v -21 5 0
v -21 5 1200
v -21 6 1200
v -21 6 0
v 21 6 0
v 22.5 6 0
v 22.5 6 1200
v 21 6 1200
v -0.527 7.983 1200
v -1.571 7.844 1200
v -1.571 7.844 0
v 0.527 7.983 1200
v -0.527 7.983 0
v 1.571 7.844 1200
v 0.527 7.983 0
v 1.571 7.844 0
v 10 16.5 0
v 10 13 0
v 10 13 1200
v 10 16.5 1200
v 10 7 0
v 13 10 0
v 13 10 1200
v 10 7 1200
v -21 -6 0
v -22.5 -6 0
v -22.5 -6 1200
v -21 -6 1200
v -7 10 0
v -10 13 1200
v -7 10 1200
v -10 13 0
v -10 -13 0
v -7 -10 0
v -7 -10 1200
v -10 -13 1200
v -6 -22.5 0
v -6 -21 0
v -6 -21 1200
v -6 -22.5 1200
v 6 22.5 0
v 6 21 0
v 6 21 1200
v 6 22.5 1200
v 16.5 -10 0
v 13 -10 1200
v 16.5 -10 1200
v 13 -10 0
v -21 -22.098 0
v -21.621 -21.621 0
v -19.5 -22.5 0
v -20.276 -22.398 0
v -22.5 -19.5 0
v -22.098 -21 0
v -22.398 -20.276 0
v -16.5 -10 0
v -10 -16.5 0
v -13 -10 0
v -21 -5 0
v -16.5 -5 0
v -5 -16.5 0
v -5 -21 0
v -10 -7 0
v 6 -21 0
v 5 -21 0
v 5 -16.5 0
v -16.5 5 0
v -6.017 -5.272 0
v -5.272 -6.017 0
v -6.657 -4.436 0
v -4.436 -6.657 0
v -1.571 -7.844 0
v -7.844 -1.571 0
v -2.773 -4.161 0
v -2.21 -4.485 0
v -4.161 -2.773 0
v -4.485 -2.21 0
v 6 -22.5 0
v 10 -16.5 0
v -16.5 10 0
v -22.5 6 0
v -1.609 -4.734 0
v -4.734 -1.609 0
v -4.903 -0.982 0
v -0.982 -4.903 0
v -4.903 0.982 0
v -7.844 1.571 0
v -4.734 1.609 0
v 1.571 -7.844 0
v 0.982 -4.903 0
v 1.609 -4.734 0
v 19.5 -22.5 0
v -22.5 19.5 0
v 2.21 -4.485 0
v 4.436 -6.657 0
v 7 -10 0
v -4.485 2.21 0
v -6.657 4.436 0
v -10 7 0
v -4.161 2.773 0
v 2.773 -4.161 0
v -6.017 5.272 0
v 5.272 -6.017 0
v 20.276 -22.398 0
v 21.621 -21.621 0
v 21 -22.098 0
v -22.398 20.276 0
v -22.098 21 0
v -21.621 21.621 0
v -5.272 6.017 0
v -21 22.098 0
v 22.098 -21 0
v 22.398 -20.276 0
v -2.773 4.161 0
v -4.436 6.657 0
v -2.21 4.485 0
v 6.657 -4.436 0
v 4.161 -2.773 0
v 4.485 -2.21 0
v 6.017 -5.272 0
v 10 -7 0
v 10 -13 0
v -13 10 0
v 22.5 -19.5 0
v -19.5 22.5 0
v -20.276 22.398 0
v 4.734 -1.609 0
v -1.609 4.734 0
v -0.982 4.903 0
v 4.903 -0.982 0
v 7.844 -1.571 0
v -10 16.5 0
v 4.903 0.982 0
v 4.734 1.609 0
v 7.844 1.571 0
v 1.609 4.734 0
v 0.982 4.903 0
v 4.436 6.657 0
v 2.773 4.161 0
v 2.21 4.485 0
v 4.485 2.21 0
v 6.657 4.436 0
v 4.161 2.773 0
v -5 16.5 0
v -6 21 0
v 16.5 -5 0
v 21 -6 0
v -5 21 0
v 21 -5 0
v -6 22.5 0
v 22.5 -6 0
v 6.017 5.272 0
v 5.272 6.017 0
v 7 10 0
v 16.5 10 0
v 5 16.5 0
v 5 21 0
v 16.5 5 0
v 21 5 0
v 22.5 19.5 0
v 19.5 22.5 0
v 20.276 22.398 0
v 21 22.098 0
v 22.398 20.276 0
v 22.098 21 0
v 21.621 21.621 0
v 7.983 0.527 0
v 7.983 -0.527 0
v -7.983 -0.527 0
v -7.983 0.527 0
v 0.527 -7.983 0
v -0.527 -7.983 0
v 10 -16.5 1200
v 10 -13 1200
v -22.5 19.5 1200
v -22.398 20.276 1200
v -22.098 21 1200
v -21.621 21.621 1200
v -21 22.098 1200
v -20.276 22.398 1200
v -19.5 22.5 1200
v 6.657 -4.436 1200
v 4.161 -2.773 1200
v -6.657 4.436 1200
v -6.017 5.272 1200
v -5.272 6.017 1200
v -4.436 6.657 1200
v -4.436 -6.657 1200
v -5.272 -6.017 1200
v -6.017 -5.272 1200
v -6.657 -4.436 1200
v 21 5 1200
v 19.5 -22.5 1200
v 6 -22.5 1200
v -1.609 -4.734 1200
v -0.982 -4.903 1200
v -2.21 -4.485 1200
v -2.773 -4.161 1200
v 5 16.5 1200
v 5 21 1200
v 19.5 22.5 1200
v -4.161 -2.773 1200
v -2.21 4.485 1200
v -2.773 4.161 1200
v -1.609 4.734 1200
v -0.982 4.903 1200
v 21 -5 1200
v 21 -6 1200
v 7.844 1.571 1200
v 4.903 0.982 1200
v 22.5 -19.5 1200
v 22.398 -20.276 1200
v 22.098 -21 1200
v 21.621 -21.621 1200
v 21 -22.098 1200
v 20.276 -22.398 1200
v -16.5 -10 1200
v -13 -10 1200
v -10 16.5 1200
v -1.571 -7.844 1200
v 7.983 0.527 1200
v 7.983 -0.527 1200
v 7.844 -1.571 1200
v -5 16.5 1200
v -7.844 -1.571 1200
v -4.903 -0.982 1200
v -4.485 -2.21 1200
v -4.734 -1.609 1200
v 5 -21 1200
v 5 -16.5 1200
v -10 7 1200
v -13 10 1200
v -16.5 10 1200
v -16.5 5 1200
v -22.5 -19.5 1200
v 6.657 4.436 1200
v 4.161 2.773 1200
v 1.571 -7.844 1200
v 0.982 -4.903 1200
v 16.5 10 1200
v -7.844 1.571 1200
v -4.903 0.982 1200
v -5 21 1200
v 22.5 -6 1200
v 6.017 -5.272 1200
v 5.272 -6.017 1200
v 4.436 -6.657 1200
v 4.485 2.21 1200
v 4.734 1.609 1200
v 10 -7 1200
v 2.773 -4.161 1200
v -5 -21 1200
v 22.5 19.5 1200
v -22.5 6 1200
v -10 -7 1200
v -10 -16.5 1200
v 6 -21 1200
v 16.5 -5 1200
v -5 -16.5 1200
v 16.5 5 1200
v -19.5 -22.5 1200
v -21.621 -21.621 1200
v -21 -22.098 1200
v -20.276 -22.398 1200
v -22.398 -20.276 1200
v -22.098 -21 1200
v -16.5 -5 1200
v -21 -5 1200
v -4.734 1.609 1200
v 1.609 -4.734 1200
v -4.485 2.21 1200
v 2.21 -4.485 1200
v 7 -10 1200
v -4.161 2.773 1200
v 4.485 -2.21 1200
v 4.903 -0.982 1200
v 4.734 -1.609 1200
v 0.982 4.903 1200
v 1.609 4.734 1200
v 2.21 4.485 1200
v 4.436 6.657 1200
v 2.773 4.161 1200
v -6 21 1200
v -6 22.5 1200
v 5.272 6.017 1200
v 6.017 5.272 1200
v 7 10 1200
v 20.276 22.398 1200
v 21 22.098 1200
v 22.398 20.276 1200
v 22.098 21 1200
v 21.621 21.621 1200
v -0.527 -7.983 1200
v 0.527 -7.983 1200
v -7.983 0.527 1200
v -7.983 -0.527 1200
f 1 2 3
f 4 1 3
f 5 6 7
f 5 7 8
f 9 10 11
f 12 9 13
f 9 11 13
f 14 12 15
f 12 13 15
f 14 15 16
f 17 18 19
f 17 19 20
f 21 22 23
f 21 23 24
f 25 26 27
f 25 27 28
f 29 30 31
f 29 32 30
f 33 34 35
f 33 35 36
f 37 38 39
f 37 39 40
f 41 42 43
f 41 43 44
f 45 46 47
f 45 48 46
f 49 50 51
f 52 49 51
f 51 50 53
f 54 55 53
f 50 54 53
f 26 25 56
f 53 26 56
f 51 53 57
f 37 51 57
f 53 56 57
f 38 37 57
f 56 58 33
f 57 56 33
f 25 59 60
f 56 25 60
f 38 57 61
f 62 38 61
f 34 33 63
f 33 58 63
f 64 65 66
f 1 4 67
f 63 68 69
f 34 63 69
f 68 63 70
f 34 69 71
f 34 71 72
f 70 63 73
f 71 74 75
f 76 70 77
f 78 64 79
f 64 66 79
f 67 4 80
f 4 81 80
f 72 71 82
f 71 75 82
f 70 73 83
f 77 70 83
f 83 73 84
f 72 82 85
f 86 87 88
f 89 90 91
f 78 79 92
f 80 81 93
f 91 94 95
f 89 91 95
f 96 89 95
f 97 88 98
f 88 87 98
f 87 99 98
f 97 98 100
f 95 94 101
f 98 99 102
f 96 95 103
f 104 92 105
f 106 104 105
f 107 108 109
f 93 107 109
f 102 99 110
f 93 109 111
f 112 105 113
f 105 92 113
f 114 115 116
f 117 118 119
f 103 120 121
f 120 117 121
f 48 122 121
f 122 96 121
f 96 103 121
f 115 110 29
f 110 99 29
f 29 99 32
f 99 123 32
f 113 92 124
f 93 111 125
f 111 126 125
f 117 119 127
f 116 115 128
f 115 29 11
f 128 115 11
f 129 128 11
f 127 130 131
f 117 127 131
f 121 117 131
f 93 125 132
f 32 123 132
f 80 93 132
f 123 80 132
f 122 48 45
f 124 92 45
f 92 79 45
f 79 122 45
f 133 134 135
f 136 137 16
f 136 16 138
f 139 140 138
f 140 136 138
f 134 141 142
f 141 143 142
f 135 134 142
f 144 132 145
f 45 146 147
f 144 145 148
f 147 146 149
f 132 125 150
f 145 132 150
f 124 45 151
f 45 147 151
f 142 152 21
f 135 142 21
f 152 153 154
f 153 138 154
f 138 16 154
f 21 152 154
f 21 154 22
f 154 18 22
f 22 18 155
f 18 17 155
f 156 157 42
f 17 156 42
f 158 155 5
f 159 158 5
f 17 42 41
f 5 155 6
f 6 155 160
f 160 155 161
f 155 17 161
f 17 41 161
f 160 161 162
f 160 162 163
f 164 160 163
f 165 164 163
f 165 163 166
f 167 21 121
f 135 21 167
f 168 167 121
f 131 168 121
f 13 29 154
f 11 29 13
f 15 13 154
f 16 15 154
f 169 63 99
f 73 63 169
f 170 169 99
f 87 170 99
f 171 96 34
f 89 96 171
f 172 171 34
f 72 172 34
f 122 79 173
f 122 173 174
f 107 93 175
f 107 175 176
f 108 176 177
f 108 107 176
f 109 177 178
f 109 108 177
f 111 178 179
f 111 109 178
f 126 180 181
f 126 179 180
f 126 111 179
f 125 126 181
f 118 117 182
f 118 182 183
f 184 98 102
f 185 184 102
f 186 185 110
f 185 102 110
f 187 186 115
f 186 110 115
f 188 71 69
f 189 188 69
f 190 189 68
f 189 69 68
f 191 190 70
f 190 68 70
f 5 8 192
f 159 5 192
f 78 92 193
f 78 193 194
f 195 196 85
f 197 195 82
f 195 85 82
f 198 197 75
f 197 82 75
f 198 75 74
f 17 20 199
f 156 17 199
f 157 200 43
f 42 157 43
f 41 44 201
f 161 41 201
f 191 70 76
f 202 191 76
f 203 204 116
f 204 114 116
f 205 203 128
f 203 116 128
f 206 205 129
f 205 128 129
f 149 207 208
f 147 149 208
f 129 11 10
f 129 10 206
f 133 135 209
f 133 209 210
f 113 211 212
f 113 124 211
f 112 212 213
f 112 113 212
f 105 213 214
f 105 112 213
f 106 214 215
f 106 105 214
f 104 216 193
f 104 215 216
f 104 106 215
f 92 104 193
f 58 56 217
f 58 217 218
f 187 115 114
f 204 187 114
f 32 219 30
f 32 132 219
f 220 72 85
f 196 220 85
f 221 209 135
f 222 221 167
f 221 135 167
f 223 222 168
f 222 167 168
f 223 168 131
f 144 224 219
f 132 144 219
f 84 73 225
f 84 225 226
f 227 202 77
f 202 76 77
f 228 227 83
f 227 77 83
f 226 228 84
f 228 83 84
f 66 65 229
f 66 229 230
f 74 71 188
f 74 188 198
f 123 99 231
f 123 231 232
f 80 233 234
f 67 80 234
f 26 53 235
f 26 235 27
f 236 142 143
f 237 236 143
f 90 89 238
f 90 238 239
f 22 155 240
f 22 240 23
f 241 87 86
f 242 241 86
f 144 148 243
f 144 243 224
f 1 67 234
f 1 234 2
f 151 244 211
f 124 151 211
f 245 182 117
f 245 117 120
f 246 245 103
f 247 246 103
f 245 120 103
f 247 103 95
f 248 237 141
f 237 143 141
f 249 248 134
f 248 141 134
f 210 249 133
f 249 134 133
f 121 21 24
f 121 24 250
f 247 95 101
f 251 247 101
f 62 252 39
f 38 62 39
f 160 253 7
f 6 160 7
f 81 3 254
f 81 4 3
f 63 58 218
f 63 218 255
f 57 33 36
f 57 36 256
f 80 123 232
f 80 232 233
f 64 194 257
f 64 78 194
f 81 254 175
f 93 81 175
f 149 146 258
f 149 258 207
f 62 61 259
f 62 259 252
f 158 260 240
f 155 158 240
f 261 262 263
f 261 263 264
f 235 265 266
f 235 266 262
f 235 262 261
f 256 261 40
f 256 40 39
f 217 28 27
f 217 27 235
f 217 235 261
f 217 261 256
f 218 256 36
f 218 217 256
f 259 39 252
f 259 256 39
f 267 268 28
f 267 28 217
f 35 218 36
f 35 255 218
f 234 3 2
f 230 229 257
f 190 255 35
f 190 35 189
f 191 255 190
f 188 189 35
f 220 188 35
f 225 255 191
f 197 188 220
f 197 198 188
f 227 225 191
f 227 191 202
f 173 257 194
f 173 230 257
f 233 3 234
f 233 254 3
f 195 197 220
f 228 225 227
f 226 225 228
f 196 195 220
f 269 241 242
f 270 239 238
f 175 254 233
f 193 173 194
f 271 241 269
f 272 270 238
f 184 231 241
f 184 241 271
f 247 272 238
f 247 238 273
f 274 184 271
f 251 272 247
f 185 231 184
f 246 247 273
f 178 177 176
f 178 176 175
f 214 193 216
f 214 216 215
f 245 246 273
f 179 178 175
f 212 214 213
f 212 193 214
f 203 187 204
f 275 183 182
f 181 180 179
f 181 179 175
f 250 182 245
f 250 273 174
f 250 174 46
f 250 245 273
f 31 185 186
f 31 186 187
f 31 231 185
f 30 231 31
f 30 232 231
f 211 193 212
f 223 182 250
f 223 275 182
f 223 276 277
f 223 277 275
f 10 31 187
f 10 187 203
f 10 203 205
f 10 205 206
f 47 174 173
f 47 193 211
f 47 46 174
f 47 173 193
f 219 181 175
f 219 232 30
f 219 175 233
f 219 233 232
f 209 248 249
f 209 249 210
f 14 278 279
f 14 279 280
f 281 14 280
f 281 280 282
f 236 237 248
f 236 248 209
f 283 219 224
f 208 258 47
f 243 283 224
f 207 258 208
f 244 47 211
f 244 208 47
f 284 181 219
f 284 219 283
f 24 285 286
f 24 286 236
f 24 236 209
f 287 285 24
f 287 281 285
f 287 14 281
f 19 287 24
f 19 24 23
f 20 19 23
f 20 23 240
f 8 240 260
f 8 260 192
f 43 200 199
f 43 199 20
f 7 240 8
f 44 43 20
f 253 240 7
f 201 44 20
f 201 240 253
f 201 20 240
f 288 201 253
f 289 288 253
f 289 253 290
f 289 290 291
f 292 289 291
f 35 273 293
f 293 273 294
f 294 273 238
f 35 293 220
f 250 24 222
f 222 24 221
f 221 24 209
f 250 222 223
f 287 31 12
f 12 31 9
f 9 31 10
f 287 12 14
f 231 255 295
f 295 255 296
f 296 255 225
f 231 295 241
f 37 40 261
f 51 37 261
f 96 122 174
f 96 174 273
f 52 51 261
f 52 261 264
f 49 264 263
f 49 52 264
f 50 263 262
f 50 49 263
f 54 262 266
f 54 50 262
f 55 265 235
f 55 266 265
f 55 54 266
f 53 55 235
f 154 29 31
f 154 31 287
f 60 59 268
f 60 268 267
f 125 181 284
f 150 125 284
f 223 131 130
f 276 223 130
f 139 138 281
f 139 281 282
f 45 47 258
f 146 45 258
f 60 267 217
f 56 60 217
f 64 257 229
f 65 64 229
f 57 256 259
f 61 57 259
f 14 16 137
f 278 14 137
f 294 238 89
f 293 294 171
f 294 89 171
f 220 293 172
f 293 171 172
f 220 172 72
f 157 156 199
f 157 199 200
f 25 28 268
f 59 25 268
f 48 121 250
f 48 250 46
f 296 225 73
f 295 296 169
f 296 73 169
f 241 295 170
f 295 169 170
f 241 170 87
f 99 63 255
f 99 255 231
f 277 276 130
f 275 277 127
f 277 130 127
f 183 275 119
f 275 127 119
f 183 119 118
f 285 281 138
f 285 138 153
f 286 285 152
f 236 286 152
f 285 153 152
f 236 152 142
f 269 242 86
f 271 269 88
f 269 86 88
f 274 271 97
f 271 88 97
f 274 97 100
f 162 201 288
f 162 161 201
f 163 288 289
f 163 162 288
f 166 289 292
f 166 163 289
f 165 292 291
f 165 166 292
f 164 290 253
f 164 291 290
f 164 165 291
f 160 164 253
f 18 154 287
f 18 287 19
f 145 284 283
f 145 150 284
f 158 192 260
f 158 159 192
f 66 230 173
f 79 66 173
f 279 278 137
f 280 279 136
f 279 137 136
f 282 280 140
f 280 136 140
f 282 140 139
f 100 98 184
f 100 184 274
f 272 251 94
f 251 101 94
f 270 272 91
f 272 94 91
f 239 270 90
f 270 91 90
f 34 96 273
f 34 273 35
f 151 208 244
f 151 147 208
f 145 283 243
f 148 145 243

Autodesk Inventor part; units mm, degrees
ref_plane "YZ Plane" through (0, 0, 0) normal (1, 0, 0) x (0, 1, 0)
ref_plane "XZ Plane" through (0, 0, 0) normal (0, 1, 0) x (-1, 0, 0)
ref_plane "XY Plane" through (0, 0, 0) normal (0, 0, 1) x (1, 0, 0)
sketch "Skizze1" plane through (0, 0, 0) normal (0, 0, 1) x (1, 0, 0)
  line L0 (-19.5, 22.5) -> (19.5, 22.5)
  line L1 (22.5, 19.5) -> (22.5, -19.5)
  line L2 (19.5, -22.5) -> (-19.5, -22.5)
  line L3 (-22.5, -19.5) -> (-22.5, 19.5)
  circle A0 centre (0, 0) radius 5
  line L4 (-32.3698, 0) -> (32.3698, 0) projected
  line L5 (0, -32.3698) -> (0, 32.3698) projected
  arc A1 (22.5, 19.5) -> (19.5, 22.5) centre (19.5, 19.5) ccw
  arc A2 (-19.5, 22.5) -> (-22.5, 19.5) centre (-19.5, 19.5) ccw
  arc A3 (-22.5, -19.5) -> (-19.5, -22.5) centre (-19.5, -19.5) ccw
  arc A4 (19.5, -22.5) -> (22.5, -19.5) centre (19.5, -19.5) ccw
  point P0 (-22.5, 22.5)
  point P1 (22.5, 22.5)
  point P2 (-22.5, -22.5)
  dimension "d0" = 45
  dimension "d1" = 45
  dimension "d2" = 10
  dimension "d3" = 3
extrude "Extrusion1" add sketch "Skizze1" along normal blind 1200 contours L0 L5 A0 L4 L3 A2 | L0 A1 L1 L4 A0 L5 | L4 A0 L5 L2 A3 L3 | L4 L1 A4 L2 L5 A0
sketch "Skizze2" plane through (0, 0, 0) normal (0, 0, -1) x (-1, 0, 0)
  line L0 (19.5, -22.5) -> (-19.5, -22.5) projected
  line L1 (31.5, 0) -> (-31.5, 0) projected
  line L2 (0, -31.5) -> (0, 31.5) projected
  line L3 (-6, -22.5) -> (-6, -21)
  line L4 (-6, -21) -> (-5, -21)
  line L5 (-5, -21) -> (-5, -16.5)
  line L6 (-5, -16.5) -> (-10, -16.5)
  line L7 (-10, -16.5) -> (-10, -13)
  line L8 (-10, -13) -> (-7, -10)
  line L9 (-7, -10) -> (7, -10)
  line L10 (7, -10) -> (10, -13)
  line L11 (10, -13) -> (10, -16.5)
  line L12 (10, -16.5) -> (5, -16.5)
  line L13 (5, -16.5) -> (5, -21)
  line L14 (5, -21) -> (6, -21)
  line L15 (6, -21) -> (6, -22.5)
  dimension "d6" = 10
  dimension "d7" = 20
  dimension "d8" = 12
  dimension "d9" = 1.5
  dimension "d10" = 12.5
  dimension "d11" = 135
  dimension "d12" = 6
  dimension "d13" = 3.5
extrude "Extrusion2" cut sketch "Skizze2" against normal through all
pattern_circular "Runde Anordnung1" count 4 over 360 about axis through (0, 0, 0) along (0, 0, 1) of "Extrusion2"
sketch "Skizze3" plane through (0, 0, 0) normal (0, 0, -1) x (-1, 0, 0)
  circle A0 centre (0, 0) radius 5 projected
  line L0 (31.5, 0) -> (-31.5, 0) projected
  line L1 (0, -31.5) -> (0, 31.5) projected
  line L2 (-1.5708, 7.8443) -> (-0.9817, 4.9027)
  line L3 (1.5708, 7.8443) -> (0.9817, 4.9027)
  arc A1 (1.5708, 7.8443) -> (-1.5708, 7.8443) centre (0, 0) ccw
  dimension "d20" = 1.9635
  dimension "d21" = 3.1416
  dimension "d22" = 8
extrude "Extrusion3" cut sketch "Skizze3" against normal through all contours A0 L1 A1 L3 | A0 L2 A1 L1
pattern_circular "Runde Anordnung2" count 8 over 360 about axis through (0, 0, 0) along (0, 0, 1) of "Extrusion3"
properties part number "Alu-Profil Nut 10 45x45 1200"
